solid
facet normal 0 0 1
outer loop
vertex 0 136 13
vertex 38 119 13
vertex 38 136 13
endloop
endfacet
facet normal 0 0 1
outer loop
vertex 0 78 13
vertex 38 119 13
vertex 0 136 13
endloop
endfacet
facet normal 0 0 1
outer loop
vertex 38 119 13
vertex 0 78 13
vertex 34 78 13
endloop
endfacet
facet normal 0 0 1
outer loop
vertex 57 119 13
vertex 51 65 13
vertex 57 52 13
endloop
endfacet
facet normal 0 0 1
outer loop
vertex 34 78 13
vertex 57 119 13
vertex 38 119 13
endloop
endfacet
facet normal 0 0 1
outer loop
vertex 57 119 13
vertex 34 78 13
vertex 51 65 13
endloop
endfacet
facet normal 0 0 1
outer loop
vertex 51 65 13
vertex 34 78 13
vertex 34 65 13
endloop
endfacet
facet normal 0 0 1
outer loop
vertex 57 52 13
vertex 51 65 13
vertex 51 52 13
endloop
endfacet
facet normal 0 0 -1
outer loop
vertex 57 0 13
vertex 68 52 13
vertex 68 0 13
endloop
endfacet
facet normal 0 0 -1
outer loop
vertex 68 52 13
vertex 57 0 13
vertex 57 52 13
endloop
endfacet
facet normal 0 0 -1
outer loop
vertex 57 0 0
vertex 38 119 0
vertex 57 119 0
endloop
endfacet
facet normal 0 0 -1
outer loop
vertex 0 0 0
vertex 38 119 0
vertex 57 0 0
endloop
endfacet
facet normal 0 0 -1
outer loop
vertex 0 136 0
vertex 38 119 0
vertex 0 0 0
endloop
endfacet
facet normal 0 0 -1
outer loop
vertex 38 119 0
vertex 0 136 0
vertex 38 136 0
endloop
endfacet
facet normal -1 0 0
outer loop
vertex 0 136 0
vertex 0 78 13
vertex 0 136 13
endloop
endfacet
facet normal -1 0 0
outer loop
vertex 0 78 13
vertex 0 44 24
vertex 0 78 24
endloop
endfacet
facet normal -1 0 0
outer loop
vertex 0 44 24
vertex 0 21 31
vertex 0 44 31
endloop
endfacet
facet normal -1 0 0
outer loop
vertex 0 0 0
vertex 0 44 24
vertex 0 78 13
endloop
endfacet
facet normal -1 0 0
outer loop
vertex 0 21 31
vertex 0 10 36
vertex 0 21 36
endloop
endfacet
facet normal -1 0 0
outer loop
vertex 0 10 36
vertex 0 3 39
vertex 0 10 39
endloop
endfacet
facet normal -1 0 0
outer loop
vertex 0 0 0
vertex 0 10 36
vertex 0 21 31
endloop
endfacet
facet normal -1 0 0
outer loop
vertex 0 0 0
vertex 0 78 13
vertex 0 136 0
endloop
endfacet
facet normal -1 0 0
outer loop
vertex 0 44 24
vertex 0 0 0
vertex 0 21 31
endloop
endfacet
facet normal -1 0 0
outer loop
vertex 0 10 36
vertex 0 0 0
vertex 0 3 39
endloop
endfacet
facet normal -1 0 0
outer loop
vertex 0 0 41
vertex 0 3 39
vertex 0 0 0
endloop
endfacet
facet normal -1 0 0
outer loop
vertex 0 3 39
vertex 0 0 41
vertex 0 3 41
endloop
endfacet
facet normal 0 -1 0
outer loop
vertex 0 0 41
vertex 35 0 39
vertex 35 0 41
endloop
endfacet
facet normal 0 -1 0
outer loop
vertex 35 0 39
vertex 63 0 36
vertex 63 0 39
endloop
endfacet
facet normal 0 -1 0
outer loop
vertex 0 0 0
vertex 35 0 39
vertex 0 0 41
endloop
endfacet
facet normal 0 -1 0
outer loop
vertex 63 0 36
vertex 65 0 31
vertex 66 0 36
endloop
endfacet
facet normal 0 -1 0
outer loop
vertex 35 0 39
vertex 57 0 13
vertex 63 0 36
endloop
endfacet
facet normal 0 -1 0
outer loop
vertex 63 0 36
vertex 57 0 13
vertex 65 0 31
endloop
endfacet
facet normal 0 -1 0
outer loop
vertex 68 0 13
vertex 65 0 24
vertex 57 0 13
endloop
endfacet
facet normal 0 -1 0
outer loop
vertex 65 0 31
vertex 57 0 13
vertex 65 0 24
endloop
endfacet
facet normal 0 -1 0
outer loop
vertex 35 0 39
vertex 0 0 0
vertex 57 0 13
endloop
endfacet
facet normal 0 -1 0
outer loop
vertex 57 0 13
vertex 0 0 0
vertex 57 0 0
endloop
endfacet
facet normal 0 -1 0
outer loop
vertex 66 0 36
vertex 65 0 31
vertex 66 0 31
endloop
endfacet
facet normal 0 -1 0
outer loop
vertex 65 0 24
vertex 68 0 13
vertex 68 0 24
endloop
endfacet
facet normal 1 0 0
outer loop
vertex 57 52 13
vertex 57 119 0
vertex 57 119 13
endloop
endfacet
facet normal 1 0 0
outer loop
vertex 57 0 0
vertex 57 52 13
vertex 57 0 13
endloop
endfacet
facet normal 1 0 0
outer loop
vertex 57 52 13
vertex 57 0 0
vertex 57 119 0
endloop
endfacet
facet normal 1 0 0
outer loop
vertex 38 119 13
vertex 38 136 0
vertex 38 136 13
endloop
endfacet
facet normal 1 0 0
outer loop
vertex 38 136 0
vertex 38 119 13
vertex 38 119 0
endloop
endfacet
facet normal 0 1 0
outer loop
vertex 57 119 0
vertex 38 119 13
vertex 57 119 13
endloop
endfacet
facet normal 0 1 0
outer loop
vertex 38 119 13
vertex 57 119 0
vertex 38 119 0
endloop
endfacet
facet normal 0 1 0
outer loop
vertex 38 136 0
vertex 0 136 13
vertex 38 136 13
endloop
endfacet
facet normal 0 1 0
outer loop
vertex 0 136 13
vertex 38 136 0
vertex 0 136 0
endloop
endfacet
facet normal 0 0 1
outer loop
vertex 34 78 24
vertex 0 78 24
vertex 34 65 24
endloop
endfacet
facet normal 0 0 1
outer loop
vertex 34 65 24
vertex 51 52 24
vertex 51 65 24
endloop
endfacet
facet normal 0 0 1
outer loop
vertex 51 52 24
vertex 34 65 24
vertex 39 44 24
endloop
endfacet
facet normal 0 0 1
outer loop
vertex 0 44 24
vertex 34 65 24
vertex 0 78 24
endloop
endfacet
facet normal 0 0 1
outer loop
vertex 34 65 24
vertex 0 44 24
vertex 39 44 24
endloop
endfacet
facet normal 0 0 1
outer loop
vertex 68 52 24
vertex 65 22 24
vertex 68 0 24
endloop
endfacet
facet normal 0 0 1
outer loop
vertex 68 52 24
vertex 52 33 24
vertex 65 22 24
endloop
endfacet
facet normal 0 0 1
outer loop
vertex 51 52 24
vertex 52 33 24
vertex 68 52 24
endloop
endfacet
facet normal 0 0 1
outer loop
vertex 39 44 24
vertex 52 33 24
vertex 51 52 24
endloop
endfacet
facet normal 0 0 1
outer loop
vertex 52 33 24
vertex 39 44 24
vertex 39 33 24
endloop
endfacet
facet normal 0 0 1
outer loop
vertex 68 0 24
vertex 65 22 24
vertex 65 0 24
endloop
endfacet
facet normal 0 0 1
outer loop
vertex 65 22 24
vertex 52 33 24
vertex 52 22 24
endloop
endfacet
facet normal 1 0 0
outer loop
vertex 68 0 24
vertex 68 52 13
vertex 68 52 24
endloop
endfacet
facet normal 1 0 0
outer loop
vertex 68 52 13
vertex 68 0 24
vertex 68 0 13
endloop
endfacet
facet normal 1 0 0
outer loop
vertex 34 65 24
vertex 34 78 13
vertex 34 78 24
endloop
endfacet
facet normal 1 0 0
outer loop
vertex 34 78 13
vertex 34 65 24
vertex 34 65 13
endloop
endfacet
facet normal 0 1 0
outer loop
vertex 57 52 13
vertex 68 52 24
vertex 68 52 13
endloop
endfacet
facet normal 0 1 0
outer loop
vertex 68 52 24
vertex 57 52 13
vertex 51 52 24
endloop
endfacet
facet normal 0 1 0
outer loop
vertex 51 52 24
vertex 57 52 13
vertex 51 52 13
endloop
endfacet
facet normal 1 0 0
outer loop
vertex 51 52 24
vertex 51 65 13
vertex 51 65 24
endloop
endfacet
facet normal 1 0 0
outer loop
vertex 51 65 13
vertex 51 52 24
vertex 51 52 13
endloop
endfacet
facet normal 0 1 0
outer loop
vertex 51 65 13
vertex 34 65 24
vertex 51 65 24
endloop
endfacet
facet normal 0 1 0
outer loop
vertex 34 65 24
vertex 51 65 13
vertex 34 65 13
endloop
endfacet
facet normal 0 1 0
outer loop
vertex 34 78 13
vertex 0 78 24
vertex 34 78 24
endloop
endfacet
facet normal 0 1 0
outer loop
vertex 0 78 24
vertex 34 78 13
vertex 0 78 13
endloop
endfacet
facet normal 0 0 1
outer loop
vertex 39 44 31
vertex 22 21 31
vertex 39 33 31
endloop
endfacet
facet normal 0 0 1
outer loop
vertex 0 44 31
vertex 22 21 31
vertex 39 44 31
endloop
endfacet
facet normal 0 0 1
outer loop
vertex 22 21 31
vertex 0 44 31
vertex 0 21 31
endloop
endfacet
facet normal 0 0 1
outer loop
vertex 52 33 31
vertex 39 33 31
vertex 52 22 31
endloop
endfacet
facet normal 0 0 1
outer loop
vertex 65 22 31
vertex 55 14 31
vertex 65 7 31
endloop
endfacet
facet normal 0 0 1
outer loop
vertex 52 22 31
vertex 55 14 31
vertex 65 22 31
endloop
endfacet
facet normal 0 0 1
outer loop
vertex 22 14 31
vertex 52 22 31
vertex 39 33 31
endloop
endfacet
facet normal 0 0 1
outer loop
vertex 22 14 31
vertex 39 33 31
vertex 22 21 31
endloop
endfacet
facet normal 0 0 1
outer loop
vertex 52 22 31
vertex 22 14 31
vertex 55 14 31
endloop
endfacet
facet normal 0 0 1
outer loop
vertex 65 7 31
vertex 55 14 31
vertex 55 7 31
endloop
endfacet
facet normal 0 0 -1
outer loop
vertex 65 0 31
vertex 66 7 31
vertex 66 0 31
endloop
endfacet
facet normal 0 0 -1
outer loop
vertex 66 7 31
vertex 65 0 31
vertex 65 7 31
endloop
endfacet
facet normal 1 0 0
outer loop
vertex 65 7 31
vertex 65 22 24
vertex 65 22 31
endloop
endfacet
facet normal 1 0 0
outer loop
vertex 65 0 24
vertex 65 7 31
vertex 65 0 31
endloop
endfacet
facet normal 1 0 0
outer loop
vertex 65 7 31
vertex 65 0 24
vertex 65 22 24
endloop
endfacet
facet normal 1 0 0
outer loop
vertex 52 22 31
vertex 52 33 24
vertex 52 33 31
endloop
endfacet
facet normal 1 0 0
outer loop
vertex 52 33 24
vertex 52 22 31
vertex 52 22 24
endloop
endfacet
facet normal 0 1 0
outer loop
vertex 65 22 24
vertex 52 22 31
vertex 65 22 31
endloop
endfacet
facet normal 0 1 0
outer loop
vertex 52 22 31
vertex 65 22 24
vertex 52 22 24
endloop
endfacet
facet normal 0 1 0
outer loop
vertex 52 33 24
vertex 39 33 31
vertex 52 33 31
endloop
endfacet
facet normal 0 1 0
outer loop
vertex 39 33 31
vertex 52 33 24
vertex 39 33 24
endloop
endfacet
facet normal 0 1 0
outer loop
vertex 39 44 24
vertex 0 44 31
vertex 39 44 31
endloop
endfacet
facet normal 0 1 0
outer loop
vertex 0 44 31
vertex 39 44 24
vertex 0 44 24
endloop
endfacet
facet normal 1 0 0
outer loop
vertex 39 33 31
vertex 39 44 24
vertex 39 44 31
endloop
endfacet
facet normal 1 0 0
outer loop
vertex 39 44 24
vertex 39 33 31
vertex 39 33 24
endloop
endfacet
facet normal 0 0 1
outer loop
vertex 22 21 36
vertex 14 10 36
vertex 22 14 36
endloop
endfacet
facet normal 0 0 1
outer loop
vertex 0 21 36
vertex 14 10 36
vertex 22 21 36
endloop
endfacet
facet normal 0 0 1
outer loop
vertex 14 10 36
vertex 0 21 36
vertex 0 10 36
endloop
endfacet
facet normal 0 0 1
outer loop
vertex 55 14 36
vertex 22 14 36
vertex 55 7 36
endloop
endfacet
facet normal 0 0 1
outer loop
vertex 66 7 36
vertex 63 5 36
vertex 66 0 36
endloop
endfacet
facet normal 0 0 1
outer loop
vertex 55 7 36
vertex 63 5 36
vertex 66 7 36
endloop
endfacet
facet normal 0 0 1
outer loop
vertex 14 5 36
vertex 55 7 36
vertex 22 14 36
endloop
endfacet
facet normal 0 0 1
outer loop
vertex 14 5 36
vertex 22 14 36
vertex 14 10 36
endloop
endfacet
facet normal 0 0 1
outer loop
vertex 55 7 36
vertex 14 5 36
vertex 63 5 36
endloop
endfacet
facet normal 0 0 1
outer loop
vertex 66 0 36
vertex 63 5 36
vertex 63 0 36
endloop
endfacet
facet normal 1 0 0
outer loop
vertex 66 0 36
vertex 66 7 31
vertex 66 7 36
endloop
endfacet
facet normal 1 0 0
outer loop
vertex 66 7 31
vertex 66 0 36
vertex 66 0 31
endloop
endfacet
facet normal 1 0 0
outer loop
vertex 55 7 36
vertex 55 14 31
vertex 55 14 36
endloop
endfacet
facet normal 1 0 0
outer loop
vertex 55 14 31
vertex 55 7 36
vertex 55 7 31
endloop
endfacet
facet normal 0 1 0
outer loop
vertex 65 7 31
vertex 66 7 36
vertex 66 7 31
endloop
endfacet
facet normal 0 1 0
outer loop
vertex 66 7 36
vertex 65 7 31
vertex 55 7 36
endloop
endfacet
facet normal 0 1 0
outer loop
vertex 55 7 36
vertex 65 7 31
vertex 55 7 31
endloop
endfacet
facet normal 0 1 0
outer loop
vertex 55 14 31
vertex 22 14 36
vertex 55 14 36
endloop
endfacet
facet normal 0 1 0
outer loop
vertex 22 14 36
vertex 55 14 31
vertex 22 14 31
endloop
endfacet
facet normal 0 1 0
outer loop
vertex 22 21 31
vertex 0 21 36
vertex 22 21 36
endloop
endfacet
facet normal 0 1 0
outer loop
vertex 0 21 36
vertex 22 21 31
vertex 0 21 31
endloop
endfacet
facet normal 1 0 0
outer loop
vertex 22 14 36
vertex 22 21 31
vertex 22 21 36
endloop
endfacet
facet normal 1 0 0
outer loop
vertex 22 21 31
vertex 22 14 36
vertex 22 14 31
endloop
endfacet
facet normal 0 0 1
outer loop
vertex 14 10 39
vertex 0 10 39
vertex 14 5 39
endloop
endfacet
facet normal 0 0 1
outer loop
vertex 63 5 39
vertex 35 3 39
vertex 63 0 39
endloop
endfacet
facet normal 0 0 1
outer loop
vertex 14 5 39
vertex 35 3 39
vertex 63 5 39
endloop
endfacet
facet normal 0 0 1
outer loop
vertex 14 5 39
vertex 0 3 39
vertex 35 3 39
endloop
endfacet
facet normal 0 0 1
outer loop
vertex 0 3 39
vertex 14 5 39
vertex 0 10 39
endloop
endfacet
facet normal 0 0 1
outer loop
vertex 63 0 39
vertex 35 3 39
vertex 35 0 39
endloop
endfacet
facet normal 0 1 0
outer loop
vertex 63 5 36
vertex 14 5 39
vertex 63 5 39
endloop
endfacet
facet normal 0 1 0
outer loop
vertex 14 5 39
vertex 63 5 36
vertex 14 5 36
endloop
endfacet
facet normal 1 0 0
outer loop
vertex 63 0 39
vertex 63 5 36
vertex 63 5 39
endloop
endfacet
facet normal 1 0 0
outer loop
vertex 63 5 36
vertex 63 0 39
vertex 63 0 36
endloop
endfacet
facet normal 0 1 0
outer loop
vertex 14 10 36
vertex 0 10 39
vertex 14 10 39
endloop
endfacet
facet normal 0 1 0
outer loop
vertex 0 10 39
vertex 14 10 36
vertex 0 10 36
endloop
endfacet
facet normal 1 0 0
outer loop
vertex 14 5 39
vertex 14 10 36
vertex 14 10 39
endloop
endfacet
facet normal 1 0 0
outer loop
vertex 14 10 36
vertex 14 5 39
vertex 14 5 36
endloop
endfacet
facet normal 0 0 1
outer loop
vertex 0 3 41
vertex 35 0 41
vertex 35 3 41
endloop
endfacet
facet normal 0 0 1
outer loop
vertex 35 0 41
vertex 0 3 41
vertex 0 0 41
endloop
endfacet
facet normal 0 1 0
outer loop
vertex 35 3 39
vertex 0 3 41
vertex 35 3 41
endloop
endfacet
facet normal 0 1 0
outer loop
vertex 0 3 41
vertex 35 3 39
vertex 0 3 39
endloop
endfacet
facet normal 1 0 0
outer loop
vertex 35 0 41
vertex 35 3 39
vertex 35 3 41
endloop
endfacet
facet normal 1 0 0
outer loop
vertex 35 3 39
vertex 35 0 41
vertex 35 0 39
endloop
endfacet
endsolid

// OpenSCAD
translate([9.5, 8.5, 6.5]) color([0.5659193535517807, 0.34743383795783944, 0.004493207256296983]) cube([19, 17, 13], center=true);
translate([28.5, 8.5, 6.5]) color([0.19077338067656535, 0.11081067227867492, 0.5406219547324049]) cube([19, 17, 13], center=true);
translate([47.5, 8.5, 6.5]) color([0.043120163042338455, 0.9281325700980793, 0.8450619723983726]) cube([19, 17, 13], center=true);
translate([9.5, 25.5, 6.5]) color([0.9452976437314561, 0.31480103278643345, 0.9052673885618943]) cube([19, 17, 13], center=true);
translate([28.5, 25.5, 6.5]) color([0.984312422520035, 0.7647314342526466, 0.2750826135755835]) cube([19, 17, 13], center=true);
translate([47.5, 25.5, 6.5]) color([0.6708893041471536, 0.5956631537339799, 0.40420330216444333]) cube([19, 17, 13], center=true);
translate([9.5, 42.5, 6.5]) color([0.3060978540144266, 0.059848190567730275, 0.12538247475645914]) cube([19, 17, 13], center=true);
translate([28.5, 42.5, 6.5]) color([0.13395615600511968, 0.48089286465431025, 0.6418933847268948]) cube([19, 17, 13], center=true);
translate([47.5, 42.5, 6.5]) color([0.7640684524444807, 0.046713759972221824, 0.8237598726124178]) cube([19, 17, 13], center=true);
translate([9.5, 59.5, 6.5]) color([0.04347122329095843, 0.5549468300580123, 0.7441478498080107]) cube([19, 17, 13], center=true);
translate([28.5, 59.5, 6.5]) color([0.631221371794228, 0.949678675683002, 0.3446983531128357]) cube([19, 17, 13], center=true);
translate([47.5, 59.5, 6.5]) color([0.5858833552375392, 0.08279906273431636, 0.5597965879322987]) cube([19, 17, 13], center=true);
translate([9.5, 76.5, 6.5]) color([0.8132988010762888, 0.20160451382548072, 0.26096450036718066]) cube([19, 17, 13], center=true);
translate([28.5, 76.5, 6.5]) color([0.7004056402196938, 0.25388196693606324, 0.25924547402140496]) cube([19, 17, 13], center=true);
translate([47.5, 76.5, 6.5]) color([0.9355152879393015, 0.9985430308431146, 0.15519843069219807]) cube([19, 17, 13], center=true);
translate([9.5, 93.5, 6.5]) color([0.9001623872580004, 0.552726485973739, 0.038601142410517486]) cube([19, 17, 13], center=true);
translate([28.5, 93.5, 6.5]) color([0.5855027152371853, 0.641549650670755, 0.0337956987021093]) cube([19, 17, 13], center=true);
translate([47.5, 93.5, 6.5]) color([0.7576919221586004, 0.817800141474185, 0.07164324218695617]) cube([19, 17, 13], center=true);
translate([9.5, 110.5, 6.5]) color([0.6483999400661788, 0.4565474809027662, 0.2387212873419211]) cube([19, 17, 13], center=true);
translate([28.5, 110.5, 6.5]) color([0.4586703816224843, 0.15938970975228217, 0.33366590673229635]) cube([19, 17, 13], center=true);
translate([47.5, 110.5, 6.5]) color([0.6552072997009475, 0.4764855561518734, 0.5559200946775417]) cube([19, 17, 13], center=true);
translate([9.5, 127.5, 6.5]) color([0.5434427938045303, 0.8205942401116392, 0.3433827981536126]) cube([19, 17, 13], center=true);
translate([28.5, 127.5, 6.5]) color([0.8129620907818157, 0.07998708713040747, 0.4277330458726053]) cube([19, 17, 13], center=true);
translate([8.5, 6.5, 18.5]) color([0.352320116536872, 0.451580638705249, 0.8335098205362665]) cube([17, 13, 11], center=true);
translate([25.5, 6.5, 18.5]) color([0.5123994004879511, 0.9872466462948367, 0.8614607202751068]) cube([17, 13, 11], center=true);
translate([42.5, 6.5, 18.5]) color([0.11884674531302208, 0.3168915355616677, 0.022725501526886682]) cube([17, 13, 11], center=true);
translate([59.5, 6.5, 18.5]) color([0.7337534213446073, 0.019200804366837798, 0.8859385148247924]) cube([17, 13, 11], center=true);
translate([8.5, 19.5, 18.5]) color([0.19334286484226215, 0.4138362902804684, 0.06203930600614804]) cube([17, 13, 11], center=true);
translate([25.5, 19.5, 18.5]) color([0.3112548872587563, 0.3895149894928328, 0.052230973545080106]) cube([17, 13, 11], center=true);
translate([42.5, 19.5, 18.5]) color([0.7675506531778632, 0.7113497195255859, 0.35788362412452357]) cube([17, 13, 11], center=true);
translate([59.5, 19.5, 18.5]) color([0.835192553154071, 0.07742180234362261, 0.05400640100767218]) cube([17, 13, 11], center=true);
translate([8.5, 32.5, 18.5]) color([0.35498029443727297, 0.9018413321683949, 0.7564677019106462]) cube([17, 13, 11], center=true);
translate([25.5, 32.5, 18.5]) color([0.6723176785539303, 0.5627357352457344, 0.80376553873448]) cube([17, 13, 11], center=true);
translate([42.5, 32.5, 18.5]) color([0.41222669318814775, 0.030688579780824843, 0.8024042864453003]) cube([17, 13, 11], center=true);
translate([59.5, 32.5, 18.5]) color([0.1904934342897321, 0.3876588498360868, 0.3576093472265096]) cube([17, 13, 11], center=true);
translate([8.5, 45.5, 18.5]) color([0.12336562593420342, 0.3507843689720118, 0.17708687785091481]) cube([17, 13, 11], center=true);
translate([25.5, 45.5, 18.5]) color([0.6160138300848896, 0.6534343577697814, 0.013646552881622753]) cube([17, 13, 11], center=true);
translate([42.5, 45.5, 18.5]) color([0.45647585236099164, 0.5540526564867162, 0.8716629944357835]) cube([17, 13, 11], center=true);
translate([59.5, 45.5, 18.5]) color([0.49603131023446156, 0.08045043690485232, 0.051723879096013836]) cube([17, 13, 11], center=true);
translate([8.5, 58.5, 18.5]) color([0.8621090829516437, 0.7907294093349121, 0.8584479311516113]) cube([17, 13, 11], center=true);
translate([25.5, 58.5, 18.5]) color([0.262242667584096, 0.6479973607947307, 0.09571804729550981]) cube([17, 13, 11], center=true);
translate([42.5, 58.5, 18.5]) color([0.8265731117136212, 0.33361293642632384, 0.9551472373193942]) cube([17, 13, 11], center=true);
translate([8.5, 71.5, 18.5]) color([0.4713825655590471, 0.0330676969459045, 0.909055877600589]) cube([17, 13, 11], center=true);
translate([25.5, 71.5, 18.5]) color([0.6255321488137767, 0.2870812860118641, 0.03680389375035842]) cube([17, 13, 11], center=true);
translate([6.5, 5.5, 27.5]) color([0.37668639673062454, 0.15686055976460878, 0.5482803113458813]) cube([13, 11, 7], center=true);
translate([19.5, 5.5, 27.5]) color([0.14688367516218315, 0.1746142788181122, 0.920869485728258]) cube([13, 11, 7], center=true);
translate([32.5, 5.5, 27.5]) color([0.6401200345146435, 0.24258141177262083, 0.8788962806324696]) cube([13, 11, 7], center=true);
translate([58.5, 5.5, 27.5]) color([0.6247158298512584, 0.9455993400800832, 0.4829167944087076]) cube([13, 11, 7], center=true);
translate([45.5, 5.5, 27.5]) color([0.8879008339780402, 0.678443807349386, 0.04416855593342761]) cube([13, 11, 7], center=true);
translate([6.5, 16.5, 27.5]) color([0.24029049005859915, 0.2815764049334011, 0.17001668338644926]) cube([13, 11, 7], center=true);
translate([19.5, 16.5, 27.5]) color([0.23818695062460127, 0.22604014846400422, 0.8783437492009086]) cube([13, 11, 7], center=true);
translate([32.5, 16.5, 27.5]) color([0.4628987935430291, 0.8765118313236592, 0.1379978834577653]) cube([13, 11, 7], center=true);
translate([45.5, 16.5, 27.5]) color([0.5649184865561083, 0.013467678145623552, 0.9303014098379871]) cube([13, 11, 7], center=true);
translate([58.5, 16.5, 27.5]) color([0.005637114397734955, 0.3899076485519639, 0.8015859586891702]) cube([13, 11, 7], center=true);
translate([6.5, 27.5, 27.5]) color([0.9998815592294843, 0.019509740361318695, 0.8240854838738103]) cube([13, 11, 7], center=true);
translate([19.5, 27.5, 27.5]) color([0.510087959495908, 0.038182020539084705, 0.7771192709025531]) cube([13, 11, 7], center=true);
translate([32.5, 27.5, 27.5]) color([0.11190241257102229, 0.6114741872824333, 0.7783252161231047]) cube([13, 11, 7], center=true);
translate([45.5, 27.5, 27.5]) color([0.6735909267280185, 0.3798743247069636, 0.026441636821160075]) cube([13, 11, 7], center=true);
translate([6.5, 38.5, 27.5]) color([0.43626396781238774, 0.9136944836857255, 0.33292336546782575]) cube([13, 11, 7], center=true);
translate([19.5, 38.5, 27.5]) color([0.24795871915323087, 0.13783083382268813, 0.5102524550010475]) cube([13, 11, 7], center=true);
translate([32.5, 38.5, 27.5]) color([0.5333482727437294, 0.07304824240354912, 0.40775848601839615]) cube([13, 11, 7], center=true);
translate([5.5, 3.5, 33.5]) color([0.6586814548864428, 0.9660506851714608, 0.43154112171906467]) cube([11, 7, 5], center=true);
translate([16.5, 3.5, 33.5]) color([0.4360353368941353, 0.47113397256850664, 0.2250334912265638]) cube([11, 7, 5], center=true);
translate([27.5, 3.5, 33.5]) color([0.3948376420144343, 0.6452647259919572, 0.39705920905186254]) cube([11, 7, 5], center=true);
translate([38.5, 3.5, 33.5]) color([0.5813757484333044, 0.8355822879997544, 0.997967573075557]) cube([11, 7, 5], center=true);
translate([60.5, 3.5, 33.5]) color([0.8850396836294676, 0.3717966269131009, 0.02172713431740758]) cube([11, 7, 5], center=true);
translate([49.5, 3.5, 33.5]) color([0.6116045995026433, 0.4745507082101075, 0.23701711204858011]) cube([11, 7, 5], center=true);
translate([5.5, 10.5, 33.5]) color([0.040304099105049285, 0.3215702389727013, 0.7980713128356309]) cube([11, 7, 5], center=true);
translate([16.5, 10.5, 33.5]) color([0.9641190068878396, 0.10666013907247773, 0.8776394117814497]) cube([11, 7, 5], center=true);
translate([27.5, 10.5, 33.5]) color([0.04871767121707815, 0.7134758188756509, 0.026795713363172546]) cube([11, 7, 5], center=true);
translate([38.5, 10.5, 33.5]) color([0.4210496822819296, 0.8702308384812625, 0.39310814762828206]) cube([11, 7, 5], center=true);
translate([49.5, 10.5, 33.5]) color([0.9245643176497426, 0.7131951411119577, 0.6041842807977467]) cube([11, 7, 5], center=true);
translate([5.5, 17.5, 33.5]) color([0.16137904800183167, 0.34049578364460964, 0.4110961642787554]) cube([11, 7, 5], center=true);
translate([16.5, 17.5, 33.5]) color([0.5902048641324954, 0.9960381602092927, 0.2837097478049315]) cube([11, 7, 5], center=true);
translate([3.5, 2.5, 37.5]) color([0.5035628908314976, 0.9334479076287334, 0.3454207937620084]) cube([7, 5, 3], center=true);
translate([10.5, 2.5, 37.5]) color([0.6286047872723735, 0.7661315386941904, 0.6302697250151431]) cube([7, 5, 3], center=true);
translate([17.5, 2.5, 37.5]) color([0.7534306798421236, 0.19569300023569658, 0.9573376868488813]) cube([7, 5, 3], center=true);
translate([24.5, 2.5, 37.5]) color([0.17689780684900636, 0.583681176041597, 0.2960426090666165]) cube([7, 5, 3], center=true);
translate([31.5, 2.5, 37.5]) color([0.6344230252613314, 0.2911104153948655, 0.4312133568145403]) cube([7, 5, 3], center=true);
translate([38.5, 2.5, 37.5]) color([0.6822225482057551, 0.2690687505540429, 0.7278758824480682]) cube([7, 5, 3], center=true);
translate([45.5, 2.5, 37.5]) color([0.346877672777792, 0.1321560972206215, 0.613128716923026]) cube([7, 5, 3], center=true);
translate([52.5, 2.5, 37.5]) color([0.1657580288590924, 0.4305774463467016, 0.398397411879296]) cube([7, 5, 3], center=true);
translate([59.5, 2.5, 37.5]) color([0.07616884739618512, 0.7107698374020727, 0.6808235651092605]) cube([7, 5, 3], center=true);
translate([3.5, 7.5, 37.5]) color([0.7777950050341181, 0.5449131408796454, 0.5539167757205721]) cube([7, 5, 3], center=true);
translate([10.5, 7.5, 37.5]) color([0.1692330029082909, 0.2074638989900912, 0.22824949048252774]) cube([7, 5, 3], center=true);
translate([2.5, 1.5, 40.0]) color([0.5253035287227936, 0.8189825824874795, 0.3569741167117525]) cube([5, 3, 2], center=true);
translate([7.5, 1.5, 40.0]) color([0.881871988053252, 0.7358782685401997, 0.7164471432061884]) cube([5, 3, 2], center=true);
translate([12.5, 1.5, 40.0]) color([0.335172129304652, 0.11847749205352176, 0.962790481106405]) cube([5, 3, 2], center=true);
translate([17.5, 1.5, 40.0]) color([0.8546106356240183, 0.4088679907725796, 0.863218190236155]) cube([5, 3, 2], center=true);
translate([22.5, 1.5, 40.0]) color([0.8992171150320745, 0.34247362336498666, 0.5015614924470504]) cube([5, 3, 2], center=true);
translate([27.5, 1.5, 40.0]) color([0.331789840259637, 0.6951575140996313, 0.9121673135171753]) cube([5, 3, 2], center=true);
translate([32.5, 1.5, 40.0]) color([0.9845441038891614, 0.743779074814013, 0.30524235393506627]) cube([5, 3, 2], center=true);
